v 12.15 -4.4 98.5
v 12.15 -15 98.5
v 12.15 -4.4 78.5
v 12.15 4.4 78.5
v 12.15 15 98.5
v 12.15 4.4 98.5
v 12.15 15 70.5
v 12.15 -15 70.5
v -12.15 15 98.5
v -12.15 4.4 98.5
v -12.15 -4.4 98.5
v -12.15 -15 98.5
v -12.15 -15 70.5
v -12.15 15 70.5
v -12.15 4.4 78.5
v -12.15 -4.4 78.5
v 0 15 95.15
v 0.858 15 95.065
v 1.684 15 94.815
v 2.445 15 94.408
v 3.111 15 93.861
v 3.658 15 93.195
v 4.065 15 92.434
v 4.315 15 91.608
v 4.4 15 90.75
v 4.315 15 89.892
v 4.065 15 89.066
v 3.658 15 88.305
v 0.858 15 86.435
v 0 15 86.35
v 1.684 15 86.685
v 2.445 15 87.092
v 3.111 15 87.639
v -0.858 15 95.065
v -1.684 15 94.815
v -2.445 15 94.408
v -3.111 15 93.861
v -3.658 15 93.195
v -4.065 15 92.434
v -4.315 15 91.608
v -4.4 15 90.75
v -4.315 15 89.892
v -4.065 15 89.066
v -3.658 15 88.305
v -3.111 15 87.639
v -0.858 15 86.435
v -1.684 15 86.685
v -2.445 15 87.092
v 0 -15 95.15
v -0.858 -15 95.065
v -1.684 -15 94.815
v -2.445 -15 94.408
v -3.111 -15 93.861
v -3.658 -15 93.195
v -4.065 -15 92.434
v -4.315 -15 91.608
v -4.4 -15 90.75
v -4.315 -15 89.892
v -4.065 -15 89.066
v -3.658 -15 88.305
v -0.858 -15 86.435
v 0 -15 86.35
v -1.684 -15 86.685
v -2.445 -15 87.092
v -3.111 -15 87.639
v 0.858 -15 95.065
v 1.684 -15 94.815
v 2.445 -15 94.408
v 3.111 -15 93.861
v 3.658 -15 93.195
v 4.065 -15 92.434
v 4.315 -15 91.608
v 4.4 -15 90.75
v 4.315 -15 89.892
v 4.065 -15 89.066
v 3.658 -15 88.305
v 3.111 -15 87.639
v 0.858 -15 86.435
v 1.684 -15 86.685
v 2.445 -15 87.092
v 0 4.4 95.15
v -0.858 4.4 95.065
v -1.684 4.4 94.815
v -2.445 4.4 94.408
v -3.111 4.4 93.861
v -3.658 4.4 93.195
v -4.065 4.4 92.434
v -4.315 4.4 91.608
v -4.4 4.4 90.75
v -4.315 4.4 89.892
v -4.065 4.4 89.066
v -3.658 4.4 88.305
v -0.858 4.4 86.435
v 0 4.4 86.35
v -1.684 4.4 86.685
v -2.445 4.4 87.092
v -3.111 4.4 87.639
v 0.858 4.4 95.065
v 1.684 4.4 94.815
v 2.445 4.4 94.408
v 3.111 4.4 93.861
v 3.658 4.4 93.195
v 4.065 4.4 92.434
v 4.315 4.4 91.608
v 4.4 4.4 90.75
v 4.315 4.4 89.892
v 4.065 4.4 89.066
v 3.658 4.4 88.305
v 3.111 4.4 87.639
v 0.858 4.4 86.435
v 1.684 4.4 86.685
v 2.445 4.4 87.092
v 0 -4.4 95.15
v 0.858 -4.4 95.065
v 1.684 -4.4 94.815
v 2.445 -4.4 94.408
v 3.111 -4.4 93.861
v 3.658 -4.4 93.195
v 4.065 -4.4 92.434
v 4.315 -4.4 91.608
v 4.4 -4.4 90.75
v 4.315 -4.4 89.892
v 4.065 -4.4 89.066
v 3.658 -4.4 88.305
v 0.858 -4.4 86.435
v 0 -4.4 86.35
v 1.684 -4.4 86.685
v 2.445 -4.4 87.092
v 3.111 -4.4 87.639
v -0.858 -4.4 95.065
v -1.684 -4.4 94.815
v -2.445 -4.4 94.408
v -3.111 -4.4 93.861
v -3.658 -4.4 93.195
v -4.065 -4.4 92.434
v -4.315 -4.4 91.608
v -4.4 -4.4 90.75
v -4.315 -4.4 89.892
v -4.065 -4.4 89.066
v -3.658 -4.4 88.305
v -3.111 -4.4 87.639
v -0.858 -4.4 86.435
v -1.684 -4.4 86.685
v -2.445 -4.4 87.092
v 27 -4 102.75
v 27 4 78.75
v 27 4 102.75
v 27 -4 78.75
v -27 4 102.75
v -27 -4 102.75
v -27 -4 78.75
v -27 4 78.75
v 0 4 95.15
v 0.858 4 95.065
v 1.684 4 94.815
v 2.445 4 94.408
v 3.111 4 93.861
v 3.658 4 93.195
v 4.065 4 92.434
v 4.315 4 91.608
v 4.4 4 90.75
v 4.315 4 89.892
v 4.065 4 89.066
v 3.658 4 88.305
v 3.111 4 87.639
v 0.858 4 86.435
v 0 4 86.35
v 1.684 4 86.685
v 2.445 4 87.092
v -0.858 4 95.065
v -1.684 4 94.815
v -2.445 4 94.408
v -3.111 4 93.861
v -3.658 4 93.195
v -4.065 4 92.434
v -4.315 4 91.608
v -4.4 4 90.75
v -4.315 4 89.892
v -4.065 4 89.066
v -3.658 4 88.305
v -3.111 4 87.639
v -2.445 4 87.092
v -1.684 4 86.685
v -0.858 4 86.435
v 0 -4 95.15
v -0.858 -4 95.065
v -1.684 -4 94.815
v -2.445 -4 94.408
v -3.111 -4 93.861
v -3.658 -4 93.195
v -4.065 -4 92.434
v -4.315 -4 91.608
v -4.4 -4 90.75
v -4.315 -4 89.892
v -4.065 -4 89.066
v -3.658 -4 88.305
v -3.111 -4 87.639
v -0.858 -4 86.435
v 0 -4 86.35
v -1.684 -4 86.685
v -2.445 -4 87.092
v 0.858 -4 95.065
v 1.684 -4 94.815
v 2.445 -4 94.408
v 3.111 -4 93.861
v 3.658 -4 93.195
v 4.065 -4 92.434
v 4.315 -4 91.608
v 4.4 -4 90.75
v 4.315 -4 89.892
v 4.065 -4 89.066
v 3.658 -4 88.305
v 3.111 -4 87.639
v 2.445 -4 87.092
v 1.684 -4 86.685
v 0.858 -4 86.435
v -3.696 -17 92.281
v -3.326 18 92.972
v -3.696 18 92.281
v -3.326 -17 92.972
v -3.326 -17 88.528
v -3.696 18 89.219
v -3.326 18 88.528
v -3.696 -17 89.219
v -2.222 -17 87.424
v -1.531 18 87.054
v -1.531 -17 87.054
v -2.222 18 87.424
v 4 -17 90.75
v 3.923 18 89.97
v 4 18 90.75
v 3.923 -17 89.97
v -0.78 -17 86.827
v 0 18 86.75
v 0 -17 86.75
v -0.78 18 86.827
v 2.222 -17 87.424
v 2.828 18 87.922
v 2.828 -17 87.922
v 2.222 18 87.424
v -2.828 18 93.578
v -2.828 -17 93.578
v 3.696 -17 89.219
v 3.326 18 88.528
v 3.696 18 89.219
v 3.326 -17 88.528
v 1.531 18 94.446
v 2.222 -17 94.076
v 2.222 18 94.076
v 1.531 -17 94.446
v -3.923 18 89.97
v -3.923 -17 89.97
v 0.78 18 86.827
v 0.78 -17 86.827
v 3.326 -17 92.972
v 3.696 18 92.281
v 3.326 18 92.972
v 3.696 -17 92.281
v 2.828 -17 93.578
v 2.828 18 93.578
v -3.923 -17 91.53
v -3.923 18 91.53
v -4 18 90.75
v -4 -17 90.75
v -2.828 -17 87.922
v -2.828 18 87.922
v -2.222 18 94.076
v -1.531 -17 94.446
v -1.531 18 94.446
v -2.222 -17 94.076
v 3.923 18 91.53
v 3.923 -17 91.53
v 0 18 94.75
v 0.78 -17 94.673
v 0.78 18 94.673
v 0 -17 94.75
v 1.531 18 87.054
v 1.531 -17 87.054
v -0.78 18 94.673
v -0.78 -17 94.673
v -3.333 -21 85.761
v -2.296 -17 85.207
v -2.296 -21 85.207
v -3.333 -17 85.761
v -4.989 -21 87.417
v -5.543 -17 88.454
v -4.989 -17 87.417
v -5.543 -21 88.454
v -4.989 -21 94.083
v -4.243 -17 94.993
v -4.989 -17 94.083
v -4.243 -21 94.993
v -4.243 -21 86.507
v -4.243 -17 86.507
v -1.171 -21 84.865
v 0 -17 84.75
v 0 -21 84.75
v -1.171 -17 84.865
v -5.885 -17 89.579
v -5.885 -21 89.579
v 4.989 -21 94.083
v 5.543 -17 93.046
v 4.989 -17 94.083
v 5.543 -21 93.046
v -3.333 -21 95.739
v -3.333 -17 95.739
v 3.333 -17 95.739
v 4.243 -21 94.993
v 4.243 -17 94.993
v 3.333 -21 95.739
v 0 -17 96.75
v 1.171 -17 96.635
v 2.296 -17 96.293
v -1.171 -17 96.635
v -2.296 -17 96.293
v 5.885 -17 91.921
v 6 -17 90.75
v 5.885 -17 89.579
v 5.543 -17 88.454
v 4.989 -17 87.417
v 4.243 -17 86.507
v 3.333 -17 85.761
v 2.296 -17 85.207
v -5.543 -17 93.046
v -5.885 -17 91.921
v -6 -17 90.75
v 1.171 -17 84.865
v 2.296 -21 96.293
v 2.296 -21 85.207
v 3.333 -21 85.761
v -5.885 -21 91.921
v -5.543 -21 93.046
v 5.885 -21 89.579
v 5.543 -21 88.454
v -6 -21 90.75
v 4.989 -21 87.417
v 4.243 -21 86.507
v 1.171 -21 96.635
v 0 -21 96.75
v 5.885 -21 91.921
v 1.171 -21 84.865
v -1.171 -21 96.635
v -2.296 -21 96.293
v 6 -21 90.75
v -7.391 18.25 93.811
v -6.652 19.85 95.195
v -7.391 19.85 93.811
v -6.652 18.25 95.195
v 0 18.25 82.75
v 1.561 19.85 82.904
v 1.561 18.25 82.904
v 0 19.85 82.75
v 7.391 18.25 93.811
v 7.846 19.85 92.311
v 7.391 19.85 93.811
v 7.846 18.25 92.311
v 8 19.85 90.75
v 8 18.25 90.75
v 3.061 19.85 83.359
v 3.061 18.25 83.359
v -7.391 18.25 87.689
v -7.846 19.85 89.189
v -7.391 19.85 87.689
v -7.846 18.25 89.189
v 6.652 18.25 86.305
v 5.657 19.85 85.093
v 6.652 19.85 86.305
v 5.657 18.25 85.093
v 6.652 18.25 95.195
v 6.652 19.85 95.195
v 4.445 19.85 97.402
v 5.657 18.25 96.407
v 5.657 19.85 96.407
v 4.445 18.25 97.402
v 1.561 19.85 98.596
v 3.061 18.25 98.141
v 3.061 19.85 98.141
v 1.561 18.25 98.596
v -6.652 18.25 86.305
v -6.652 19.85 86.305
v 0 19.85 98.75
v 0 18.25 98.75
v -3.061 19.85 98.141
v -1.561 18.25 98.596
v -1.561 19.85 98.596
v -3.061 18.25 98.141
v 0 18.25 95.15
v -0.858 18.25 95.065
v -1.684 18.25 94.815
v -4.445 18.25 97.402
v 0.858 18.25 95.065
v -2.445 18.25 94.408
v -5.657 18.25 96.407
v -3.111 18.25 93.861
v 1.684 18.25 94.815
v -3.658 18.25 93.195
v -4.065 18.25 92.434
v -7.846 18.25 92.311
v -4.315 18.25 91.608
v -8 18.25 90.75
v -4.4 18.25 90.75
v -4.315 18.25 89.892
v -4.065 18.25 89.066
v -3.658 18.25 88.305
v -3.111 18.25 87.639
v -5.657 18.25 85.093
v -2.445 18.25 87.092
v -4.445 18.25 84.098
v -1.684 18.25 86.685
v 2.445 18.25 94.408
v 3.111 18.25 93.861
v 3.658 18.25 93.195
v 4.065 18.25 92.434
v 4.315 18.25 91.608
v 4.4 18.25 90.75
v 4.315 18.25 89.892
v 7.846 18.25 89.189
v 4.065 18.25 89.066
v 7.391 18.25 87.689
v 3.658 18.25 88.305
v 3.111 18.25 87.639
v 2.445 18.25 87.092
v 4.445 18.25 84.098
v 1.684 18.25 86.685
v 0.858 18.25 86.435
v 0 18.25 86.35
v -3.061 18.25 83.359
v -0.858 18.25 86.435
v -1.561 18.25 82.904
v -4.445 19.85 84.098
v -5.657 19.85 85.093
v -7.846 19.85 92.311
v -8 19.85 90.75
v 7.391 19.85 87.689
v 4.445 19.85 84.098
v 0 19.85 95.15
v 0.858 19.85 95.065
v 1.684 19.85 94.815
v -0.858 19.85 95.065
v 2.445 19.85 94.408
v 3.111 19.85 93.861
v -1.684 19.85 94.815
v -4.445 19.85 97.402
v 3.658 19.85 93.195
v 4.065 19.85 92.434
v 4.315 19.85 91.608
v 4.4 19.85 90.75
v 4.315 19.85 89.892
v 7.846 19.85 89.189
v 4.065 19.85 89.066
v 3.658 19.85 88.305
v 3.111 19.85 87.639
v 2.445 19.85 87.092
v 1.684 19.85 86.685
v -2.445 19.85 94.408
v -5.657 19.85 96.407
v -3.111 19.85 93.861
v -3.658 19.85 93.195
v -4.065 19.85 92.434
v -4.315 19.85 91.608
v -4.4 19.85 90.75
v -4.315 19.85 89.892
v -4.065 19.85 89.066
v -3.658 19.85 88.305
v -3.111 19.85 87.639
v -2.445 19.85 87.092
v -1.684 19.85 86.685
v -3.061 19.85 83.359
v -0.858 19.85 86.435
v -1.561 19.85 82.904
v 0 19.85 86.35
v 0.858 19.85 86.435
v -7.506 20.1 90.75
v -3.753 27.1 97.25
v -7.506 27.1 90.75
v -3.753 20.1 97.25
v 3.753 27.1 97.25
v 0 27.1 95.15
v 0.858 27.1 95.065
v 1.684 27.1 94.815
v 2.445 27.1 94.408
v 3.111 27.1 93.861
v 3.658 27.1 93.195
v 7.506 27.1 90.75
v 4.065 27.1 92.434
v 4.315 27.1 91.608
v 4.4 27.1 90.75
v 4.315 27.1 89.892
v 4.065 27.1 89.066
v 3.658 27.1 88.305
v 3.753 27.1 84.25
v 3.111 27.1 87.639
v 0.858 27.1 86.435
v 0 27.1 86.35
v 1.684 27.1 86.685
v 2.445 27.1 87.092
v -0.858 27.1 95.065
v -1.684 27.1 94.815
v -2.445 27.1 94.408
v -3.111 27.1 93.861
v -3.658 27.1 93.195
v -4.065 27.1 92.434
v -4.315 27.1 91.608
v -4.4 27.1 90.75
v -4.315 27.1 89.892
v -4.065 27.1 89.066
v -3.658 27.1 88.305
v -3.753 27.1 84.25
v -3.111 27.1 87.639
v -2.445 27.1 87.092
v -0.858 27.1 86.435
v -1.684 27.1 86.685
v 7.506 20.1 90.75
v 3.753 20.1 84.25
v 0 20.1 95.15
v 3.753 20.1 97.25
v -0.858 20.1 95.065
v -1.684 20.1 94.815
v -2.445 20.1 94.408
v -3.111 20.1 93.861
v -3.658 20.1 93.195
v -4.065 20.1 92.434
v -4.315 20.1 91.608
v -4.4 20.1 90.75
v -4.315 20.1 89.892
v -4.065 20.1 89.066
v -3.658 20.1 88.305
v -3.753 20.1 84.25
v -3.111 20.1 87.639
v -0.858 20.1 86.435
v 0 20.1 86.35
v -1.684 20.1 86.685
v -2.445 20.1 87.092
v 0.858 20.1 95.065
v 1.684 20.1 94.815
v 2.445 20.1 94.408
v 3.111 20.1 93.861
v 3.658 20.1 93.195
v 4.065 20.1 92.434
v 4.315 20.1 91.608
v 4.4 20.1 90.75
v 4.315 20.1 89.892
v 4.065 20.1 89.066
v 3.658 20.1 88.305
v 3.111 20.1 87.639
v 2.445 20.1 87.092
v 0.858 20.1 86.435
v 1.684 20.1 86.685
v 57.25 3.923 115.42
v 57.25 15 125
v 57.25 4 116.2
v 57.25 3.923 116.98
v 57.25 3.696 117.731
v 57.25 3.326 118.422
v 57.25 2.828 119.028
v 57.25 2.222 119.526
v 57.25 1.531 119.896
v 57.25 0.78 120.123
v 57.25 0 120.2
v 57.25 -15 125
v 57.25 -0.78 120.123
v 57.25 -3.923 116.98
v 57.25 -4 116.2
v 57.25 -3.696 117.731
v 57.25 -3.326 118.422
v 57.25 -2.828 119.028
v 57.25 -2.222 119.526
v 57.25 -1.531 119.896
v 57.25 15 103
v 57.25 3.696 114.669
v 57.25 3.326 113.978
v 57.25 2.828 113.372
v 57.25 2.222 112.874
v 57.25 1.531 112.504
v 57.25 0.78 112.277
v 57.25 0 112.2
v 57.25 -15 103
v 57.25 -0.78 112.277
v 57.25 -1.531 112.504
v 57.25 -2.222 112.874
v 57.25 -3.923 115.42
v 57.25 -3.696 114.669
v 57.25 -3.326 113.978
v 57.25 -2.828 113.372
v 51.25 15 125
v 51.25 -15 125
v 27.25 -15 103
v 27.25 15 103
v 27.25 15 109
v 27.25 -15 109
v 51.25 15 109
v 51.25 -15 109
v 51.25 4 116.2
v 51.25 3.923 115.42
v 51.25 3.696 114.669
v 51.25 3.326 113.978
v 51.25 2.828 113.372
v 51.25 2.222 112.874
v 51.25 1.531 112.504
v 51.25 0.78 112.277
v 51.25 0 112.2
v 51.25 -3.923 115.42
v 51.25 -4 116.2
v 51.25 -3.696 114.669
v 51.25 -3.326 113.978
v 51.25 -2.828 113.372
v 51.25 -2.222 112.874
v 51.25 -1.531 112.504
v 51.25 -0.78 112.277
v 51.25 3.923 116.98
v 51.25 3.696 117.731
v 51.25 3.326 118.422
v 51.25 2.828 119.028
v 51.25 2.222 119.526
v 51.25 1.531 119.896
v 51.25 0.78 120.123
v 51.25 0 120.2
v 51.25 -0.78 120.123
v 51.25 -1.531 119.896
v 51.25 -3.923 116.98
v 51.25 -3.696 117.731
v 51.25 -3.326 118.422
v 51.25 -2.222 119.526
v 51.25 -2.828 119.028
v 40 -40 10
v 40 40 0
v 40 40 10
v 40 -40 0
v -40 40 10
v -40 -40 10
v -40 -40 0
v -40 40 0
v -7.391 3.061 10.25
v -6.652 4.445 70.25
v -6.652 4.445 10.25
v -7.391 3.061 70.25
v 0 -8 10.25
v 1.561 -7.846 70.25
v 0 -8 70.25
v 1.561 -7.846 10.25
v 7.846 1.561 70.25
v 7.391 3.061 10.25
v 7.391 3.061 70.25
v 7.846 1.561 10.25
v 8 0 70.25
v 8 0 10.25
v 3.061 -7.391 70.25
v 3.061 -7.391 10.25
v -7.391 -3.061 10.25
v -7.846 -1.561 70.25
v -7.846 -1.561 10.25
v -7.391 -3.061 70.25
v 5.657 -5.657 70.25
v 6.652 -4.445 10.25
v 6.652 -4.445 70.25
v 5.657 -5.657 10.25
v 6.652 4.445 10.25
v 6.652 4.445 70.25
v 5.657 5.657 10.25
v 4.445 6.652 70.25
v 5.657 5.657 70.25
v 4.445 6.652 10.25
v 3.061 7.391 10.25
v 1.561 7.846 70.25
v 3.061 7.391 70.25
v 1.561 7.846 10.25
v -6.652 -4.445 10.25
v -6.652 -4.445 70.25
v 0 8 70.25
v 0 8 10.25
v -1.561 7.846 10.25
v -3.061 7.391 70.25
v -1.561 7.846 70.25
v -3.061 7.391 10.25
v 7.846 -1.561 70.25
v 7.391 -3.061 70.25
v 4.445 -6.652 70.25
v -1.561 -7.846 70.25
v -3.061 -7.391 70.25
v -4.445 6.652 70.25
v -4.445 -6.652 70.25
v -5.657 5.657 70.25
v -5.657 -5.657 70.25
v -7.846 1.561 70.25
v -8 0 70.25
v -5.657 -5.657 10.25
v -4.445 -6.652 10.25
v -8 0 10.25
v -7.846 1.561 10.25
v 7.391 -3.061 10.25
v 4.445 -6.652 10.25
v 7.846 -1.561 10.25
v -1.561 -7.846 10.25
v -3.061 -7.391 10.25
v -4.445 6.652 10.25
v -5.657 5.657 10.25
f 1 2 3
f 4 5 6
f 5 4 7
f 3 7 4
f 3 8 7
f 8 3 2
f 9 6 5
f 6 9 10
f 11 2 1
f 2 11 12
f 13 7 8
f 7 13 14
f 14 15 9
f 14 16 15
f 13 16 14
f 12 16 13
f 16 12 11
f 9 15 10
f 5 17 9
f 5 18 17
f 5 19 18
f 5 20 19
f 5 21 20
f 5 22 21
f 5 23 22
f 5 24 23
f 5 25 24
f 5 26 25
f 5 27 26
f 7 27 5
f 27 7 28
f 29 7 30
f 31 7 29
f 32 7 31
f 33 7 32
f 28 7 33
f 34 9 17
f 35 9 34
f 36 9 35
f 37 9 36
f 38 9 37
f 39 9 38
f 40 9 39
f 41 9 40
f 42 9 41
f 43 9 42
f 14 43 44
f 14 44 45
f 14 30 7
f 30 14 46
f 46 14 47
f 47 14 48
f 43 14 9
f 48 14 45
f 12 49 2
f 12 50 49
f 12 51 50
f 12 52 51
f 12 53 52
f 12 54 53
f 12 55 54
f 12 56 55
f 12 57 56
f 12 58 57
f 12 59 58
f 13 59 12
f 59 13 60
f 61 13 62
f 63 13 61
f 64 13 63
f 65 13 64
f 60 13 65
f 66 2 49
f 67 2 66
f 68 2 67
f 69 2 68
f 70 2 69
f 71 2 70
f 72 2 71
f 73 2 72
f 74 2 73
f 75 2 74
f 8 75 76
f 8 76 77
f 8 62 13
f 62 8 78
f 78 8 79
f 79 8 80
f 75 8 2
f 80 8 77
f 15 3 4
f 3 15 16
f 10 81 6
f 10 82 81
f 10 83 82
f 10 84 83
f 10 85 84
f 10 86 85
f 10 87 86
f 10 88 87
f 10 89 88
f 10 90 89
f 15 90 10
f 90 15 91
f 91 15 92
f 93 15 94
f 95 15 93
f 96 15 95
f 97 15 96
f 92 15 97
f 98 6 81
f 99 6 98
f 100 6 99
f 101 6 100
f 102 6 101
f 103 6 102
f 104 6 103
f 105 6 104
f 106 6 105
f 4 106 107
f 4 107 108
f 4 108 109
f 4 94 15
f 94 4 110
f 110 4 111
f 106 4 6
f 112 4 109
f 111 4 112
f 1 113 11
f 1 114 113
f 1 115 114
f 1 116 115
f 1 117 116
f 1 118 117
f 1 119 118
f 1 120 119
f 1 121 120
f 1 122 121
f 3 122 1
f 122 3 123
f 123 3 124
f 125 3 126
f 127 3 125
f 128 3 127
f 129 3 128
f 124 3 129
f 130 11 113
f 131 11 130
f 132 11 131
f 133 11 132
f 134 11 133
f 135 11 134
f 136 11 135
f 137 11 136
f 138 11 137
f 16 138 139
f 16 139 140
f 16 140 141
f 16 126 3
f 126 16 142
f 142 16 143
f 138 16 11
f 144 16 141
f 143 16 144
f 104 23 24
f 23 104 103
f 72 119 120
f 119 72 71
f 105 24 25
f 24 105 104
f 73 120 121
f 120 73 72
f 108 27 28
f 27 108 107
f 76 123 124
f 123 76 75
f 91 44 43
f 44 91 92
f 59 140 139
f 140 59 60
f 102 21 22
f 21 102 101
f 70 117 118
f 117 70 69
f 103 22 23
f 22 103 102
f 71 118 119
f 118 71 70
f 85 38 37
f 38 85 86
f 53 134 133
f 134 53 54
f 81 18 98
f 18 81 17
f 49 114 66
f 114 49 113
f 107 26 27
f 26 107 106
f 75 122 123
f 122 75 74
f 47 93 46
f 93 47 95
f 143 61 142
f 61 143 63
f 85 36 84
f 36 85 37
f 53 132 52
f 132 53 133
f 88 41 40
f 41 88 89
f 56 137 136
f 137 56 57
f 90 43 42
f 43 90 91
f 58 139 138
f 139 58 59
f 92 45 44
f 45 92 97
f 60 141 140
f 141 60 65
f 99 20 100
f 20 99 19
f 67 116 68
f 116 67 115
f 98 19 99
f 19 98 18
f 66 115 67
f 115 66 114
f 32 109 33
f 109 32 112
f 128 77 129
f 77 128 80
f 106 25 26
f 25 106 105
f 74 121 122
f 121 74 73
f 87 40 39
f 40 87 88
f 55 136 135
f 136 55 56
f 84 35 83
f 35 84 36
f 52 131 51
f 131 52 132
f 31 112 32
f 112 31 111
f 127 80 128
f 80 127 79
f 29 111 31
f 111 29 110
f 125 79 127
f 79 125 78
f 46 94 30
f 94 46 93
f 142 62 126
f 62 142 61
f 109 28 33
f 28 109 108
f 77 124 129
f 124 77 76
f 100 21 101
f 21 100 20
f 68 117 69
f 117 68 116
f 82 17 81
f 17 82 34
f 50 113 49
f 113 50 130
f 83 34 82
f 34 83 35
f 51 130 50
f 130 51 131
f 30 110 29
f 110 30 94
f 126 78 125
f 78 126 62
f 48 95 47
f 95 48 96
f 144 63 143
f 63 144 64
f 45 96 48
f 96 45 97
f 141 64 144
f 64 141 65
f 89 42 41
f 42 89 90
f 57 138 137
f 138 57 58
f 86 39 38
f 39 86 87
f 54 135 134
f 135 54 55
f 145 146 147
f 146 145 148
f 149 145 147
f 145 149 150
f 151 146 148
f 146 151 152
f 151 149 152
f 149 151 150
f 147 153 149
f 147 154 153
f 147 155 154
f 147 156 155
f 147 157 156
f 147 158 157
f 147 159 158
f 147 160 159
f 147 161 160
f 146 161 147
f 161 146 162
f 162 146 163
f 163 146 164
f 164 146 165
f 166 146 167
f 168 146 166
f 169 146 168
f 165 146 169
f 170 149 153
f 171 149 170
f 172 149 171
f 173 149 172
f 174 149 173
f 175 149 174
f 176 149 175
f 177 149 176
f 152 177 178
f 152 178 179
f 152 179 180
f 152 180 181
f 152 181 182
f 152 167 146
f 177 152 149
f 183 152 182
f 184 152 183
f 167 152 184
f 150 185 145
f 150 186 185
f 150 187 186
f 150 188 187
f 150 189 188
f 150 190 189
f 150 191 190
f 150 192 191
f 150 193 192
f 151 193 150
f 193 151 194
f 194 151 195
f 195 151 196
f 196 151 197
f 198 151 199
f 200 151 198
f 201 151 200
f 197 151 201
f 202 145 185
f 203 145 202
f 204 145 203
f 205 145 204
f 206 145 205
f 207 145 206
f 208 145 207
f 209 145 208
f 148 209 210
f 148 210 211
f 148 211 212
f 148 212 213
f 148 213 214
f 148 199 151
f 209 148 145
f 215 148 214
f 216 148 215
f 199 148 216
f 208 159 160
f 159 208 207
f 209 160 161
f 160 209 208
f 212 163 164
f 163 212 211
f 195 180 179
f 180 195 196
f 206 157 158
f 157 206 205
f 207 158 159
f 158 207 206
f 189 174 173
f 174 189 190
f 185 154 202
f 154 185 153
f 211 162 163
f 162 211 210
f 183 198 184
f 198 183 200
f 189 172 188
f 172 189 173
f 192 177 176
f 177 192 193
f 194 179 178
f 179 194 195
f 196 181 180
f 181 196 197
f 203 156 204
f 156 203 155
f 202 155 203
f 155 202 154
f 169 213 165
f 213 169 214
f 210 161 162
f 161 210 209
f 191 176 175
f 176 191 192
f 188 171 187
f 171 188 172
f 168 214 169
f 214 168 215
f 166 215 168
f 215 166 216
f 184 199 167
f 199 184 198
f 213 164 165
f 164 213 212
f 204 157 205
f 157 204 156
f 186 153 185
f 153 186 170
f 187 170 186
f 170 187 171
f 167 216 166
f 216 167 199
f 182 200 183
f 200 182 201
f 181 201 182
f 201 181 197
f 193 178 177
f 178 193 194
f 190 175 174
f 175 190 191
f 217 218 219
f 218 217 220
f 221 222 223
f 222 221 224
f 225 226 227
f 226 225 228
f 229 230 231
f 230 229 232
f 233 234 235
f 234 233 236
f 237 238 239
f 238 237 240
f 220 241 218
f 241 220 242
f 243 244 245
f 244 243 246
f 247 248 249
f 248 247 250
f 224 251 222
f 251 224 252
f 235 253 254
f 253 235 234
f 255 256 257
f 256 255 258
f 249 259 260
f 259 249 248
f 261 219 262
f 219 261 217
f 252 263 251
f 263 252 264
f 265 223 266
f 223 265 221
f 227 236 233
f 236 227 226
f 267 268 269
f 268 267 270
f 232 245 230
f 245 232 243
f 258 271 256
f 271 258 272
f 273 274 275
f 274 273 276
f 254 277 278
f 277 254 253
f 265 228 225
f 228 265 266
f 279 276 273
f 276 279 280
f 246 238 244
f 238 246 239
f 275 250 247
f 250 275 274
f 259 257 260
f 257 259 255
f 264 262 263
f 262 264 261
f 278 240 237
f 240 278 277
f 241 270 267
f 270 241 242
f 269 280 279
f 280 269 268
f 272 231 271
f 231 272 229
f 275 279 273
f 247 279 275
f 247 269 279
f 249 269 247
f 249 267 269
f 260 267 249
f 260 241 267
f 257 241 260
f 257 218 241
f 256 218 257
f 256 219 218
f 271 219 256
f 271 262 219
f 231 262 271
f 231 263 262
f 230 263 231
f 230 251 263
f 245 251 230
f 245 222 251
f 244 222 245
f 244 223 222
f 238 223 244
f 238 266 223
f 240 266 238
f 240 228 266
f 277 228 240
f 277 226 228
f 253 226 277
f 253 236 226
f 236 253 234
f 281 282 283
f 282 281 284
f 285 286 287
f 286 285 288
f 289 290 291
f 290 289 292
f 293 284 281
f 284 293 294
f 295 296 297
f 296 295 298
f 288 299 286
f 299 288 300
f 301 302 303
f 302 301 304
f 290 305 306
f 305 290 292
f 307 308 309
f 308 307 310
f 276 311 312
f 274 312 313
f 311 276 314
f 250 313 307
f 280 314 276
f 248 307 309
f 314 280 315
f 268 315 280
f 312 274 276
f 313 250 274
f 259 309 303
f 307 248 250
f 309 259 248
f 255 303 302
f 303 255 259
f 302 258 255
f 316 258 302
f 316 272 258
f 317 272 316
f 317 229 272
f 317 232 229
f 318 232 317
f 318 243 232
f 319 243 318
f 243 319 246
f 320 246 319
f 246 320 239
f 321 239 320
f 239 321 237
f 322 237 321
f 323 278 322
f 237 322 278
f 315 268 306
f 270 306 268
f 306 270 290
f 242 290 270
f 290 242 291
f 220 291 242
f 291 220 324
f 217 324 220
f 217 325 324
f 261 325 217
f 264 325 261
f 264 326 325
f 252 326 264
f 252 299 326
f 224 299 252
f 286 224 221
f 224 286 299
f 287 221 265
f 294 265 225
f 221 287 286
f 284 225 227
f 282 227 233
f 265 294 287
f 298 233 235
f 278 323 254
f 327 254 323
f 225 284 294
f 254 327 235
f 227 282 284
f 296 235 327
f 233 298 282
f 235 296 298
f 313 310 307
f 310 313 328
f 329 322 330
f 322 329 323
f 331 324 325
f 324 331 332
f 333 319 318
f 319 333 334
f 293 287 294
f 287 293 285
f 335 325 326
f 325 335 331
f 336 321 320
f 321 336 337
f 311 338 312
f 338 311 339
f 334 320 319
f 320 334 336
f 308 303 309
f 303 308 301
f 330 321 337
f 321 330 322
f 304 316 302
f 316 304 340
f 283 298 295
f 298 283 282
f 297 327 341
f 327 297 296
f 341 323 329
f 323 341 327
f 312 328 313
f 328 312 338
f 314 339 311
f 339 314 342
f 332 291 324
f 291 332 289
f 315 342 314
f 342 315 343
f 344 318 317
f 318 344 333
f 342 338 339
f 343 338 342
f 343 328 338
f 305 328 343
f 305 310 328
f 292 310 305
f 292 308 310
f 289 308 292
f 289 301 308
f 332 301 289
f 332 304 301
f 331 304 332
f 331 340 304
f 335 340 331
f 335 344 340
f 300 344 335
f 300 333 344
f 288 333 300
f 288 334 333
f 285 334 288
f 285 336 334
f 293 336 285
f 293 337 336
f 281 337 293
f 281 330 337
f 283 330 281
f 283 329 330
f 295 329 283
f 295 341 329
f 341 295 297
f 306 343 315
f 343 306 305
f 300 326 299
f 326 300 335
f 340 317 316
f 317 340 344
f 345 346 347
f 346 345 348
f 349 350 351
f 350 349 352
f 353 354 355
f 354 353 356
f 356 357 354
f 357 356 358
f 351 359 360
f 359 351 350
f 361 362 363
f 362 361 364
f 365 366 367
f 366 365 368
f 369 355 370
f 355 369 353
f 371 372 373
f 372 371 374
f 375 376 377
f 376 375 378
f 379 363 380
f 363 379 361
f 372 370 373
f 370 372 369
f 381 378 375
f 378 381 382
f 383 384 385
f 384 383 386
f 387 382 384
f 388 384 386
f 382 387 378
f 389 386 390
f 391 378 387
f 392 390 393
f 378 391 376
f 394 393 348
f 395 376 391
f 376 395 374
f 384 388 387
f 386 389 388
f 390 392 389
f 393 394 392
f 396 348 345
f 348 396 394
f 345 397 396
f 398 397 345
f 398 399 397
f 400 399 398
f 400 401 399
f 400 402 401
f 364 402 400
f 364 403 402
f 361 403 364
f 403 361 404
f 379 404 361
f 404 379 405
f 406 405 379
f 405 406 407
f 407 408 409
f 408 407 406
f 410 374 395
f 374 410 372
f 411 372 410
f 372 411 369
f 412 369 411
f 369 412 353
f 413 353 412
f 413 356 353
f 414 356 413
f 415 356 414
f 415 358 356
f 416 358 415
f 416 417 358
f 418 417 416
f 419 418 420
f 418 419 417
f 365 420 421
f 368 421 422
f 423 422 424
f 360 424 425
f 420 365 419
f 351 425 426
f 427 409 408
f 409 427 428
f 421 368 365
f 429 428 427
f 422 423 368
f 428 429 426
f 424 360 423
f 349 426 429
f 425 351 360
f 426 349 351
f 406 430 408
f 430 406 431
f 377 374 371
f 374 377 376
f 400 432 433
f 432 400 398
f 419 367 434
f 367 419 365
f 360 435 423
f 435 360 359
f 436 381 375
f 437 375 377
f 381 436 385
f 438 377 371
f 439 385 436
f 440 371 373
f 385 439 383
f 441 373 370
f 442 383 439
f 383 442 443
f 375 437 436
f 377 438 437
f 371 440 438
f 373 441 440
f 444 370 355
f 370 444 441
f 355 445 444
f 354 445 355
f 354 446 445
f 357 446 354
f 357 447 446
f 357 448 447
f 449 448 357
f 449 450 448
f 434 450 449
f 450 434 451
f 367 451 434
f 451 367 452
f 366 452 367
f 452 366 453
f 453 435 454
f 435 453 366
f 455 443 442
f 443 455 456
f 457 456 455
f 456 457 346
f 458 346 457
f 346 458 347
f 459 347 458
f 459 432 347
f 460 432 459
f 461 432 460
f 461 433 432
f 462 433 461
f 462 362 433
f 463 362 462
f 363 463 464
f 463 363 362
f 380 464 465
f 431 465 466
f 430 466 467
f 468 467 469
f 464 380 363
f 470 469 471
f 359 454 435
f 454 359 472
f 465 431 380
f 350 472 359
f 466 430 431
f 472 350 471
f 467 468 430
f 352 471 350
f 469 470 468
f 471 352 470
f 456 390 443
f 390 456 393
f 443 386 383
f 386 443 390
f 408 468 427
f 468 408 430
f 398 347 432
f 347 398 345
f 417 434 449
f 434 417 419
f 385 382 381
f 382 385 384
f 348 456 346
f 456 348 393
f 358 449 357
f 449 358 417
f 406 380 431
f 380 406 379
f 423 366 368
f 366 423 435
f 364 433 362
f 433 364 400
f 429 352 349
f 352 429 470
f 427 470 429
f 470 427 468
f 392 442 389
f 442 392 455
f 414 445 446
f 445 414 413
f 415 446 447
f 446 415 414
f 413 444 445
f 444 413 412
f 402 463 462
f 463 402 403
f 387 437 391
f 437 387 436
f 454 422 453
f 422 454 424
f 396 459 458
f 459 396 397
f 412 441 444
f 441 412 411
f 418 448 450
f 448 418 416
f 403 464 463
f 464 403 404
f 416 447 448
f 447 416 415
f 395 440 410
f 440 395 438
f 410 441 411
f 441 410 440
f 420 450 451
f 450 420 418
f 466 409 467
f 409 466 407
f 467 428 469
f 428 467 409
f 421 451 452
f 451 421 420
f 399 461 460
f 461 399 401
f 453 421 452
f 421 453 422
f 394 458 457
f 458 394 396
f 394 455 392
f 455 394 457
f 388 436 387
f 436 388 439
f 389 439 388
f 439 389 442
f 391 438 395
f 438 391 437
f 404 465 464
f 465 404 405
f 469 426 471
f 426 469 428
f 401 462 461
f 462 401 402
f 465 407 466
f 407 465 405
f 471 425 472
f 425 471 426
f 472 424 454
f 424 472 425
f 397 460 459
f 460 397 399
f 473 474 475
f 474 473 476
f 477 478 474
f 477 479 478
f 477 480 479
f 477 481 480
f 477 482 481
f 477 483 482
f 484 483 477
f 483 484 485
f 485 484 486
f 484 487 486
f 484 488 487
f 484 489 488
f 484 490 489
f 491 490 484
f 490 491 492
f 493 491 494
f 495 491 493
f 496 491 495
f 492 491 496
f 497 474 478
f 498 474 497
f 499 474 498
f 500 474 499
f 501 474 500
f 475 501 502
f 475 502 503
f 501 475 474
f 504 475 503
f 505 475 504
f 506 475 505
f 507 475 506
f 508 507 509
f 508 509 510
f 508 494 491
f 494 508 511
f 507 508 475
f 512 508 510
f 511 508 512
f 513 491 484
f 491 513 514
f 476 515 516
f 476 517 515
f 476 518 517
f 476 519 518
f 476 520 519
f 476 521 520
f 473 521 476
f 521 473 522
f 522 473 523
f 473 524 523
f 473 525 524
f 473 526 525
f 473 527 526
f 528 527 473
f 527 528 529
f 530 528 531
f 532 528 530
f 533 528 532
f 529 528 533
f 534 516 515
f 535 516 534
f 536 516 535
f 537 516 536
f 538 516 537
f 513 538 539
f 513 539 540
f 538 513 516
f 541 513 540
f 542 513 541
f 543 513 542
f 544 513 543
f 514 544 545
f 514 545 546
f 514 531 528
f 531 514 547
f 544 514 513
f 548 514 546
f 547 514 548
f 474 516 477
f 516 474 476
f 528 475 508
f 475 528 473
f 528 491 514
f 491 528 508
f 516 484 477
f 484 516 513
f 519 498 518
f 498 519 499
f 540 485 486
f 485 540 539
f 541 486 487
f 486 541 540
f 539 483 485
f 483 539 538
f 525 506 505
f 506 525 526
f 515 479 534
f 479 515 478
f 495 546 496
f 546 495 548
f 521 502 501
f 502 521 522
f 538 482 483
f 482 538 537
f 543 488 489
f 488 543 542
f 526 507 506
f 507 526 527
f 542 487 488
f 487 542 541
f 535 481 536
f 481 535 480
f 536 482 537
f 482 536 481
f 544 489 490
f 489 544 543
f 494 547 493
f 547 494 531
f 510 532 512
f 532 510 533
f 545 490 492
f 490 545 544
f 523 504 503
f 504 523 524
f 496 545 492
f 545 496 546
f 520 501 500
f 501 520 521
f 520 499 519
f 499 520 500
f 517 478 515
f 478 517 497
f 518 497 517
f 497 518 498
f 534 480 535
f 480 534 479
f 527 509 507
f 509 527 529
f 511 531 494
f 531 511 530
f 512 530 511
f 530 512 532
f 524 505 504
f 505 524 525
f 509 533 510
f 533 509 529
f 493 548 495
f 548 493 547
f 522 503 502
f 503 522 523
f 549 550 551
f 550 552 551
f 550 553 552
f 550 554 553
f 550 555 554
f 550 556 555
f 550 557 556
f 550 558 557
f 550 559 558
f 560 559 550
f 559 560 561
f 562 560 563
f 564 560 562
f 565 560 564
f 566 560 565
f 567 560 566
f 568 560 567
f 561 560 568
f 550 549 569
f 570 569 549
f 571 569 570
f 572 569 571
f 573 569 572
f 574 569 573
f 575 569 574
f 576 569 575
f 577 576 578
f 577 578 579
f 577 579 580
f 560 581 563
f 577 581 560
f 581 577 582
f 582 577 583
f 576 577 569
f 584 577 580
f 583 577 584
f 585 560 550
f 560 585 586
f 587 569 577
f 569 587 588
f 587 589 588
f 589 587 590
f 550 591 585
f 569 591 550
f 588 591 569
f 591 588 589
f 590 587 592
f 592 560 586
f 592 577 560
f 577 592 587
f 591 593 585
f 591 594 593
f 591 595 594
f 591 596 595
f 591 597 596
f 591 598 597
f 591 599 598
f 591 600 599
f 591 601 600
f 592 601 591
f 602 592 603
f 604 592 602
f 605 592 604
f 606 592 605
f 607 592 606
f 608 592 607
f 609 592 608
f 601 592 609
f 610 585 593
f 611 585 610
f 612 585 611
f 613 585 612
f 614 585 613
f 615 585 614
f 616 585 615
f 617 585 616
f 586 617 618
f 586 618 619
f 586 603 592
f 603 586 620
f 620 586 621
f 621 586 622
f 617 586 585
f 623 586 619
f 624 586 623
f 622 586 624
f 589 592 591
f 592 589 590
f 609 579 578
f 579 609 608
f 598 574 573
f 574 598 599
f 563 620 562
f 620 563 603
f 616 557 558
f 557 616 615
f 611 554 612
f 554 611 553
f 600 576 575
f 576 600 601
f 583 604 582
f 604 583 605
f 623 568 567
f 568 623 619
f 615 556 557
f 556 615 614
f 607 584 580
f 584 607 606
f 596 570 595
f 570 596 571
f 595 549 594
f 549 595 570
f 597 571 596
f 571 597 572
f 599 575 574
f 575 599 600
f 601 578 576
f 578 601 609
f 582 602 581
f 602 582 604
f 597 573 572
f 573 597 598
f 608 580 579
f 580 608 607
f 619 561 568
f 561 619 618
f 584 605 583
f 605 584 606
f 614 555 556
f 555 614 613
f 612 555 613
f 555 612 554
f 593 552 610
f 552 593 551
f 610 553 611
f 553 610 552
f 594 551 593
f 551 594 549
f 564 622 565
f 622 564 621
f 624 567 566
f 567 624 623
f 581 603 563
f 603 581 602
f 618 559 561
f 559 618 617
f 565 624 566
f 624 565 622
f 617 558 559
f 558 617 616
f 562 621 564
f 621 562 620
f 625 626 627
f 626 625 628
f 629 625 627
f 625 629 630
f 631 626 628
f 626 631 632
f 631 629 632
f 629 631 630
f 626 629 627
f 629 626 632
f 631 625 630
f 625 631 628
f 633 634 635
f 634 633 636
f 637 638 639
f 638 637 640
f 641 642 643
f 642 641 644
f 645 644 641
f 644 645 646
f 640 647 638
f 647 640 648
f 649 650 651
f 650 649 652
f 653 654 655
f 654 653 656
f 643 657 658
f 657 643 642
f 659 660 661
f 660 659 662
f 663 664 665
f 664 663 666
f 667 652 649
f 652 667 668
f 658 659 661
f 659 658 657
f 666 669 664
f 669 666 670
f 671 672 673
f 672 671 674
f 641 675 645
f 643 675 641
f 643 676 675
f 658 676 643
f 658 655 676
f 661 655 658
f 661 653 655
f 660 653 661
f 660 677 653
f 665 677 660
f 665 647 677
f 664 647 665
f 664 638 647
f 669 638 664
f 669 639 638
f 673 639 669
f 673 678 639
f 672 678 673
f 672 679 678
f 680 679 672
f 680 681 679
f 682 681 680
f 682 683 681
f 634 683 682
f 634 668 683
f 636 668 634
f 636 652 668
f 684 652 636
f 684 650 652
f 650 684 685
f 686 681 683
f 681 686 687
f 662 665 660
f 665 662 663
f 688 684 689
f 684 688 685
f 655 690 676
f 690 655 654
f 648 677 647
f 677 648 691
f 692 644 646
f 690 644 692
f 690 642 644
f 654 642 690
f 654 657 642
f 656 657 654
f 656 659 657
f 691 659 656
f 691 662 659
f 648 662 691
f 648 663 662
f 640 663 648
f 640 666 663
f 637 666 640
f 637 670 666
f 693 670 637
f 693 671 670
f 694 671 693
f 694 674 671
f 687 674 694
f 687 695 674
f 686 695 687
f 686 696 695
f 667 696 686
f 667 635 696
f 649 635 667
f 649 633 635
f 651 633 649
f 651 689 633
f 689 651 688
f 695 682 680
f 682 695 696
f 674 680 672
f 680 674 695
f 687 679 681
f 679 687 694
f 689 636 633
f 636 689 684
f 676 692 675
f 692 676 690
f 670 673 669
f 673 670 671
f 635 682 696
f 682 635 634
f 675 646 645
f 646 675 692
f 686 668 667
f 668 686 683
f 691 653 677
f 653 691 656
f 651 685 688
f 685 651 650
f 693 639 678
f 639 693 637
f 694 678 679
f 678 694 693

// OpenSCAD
$fn = 32;

// ------------------------------------------------------------------------
// Lamp arm: column d16 x 60 mm, arm 54 mm
// Every part is its own module, assembly() places every instance.
// ------------------------------------------------------------------------

// --- part 1 ---
module lamp_base() {
  difference() {
    translate([-40, -40, 0]) cube([80, 80, 10]);
  }
}

// --- part 2 ---
module lamp_column() {
  cylinder(h = 60, d = 16);
}

// --- part 3 ---
module head_fork() {
  difference() {
    translate([-12.15, -15, 0]) cube([24.3, 30, 28]);
    translate([-13.15, -4.4, 8]) cube([26.3, 8.8, 21]);
    translate([0, 0, 20.25]) rotate([90, 0, 0]) cylinder(h = 32, d = 8.8, center = true);
  }
}

// --- part 4 ---
module lamp_arm() {
  difference() {
    translate([-27, -4, 0]) cube([54, 8, 24]);
    translate([0, 0, 12]) rotate([90, 0, 0]) cylinder(h = 10, d = 8.8, center = true);
  }
}

// --- part 5 ---
module arm_pin() {
  rotate([0, 90, 0]) cylinder(h = 36, d = 8, center = true);
  translate([-21, 0, 0]) rotate([0, 90, 0]) cylinder(h = 4, d = 12);
}

// --- part 6 ---
module arm_washer() {
  difference() {
      translate([0, 0, 0]) cylinder(h = 1.6, d = 16);
      translate([0, 0, -1]) cylinder(h = 3.6, d = 8.8);
    }
}

// --- part 7 ---
module arm_nut() {
  difference() {
    linear_extrude(height = 7) polygon(points = [[7.506, 0], [3.753, 6.5], [-3.753, 6.5], [-7.506, 0], [-3.753, -6.5], [3.753, -6.5]]);
    translate([0, 0, -1]) cylinder(h = 9, d = 8.8);
  }
}

// --- part 8 ---
module shade_bracket() {
  difference() {
    translate([-15, -15, 0]) cube([30, 30, 22]);
    translate([-16, -16, 6]) cube([25, 32, 17]);
    translate([12, 0, 13.2]) rotate([0, 90, 0]) cylinder(h = 8, d = 8, center = true);
  }
}

// --- assembly ---
module assembly() {
  color([0.80, 0.24, 0.20]) translate([0, 0, 0]) rotate([0, 0, 0]) lamp_base();
  color([0.20, 0.45, 0.75]) translate([0, 0, 10.25]) rotate([0, 0, 0]) lamp_column();
  color([0.25, 0.62, 0.32]) translate([0, 0, 70.5]) rotate([0, 0, 0]) head_fork();
  color([0.92, 0.70, 0.18]) translate([0, 0, 78.75]) rotate([0, 0, 0]) lamp_arm();
  color([0.58, 0.35, 0.70]) translate([0, 0, 90.75]) rotate([0, 0, 90]) arm_pin();
  color([0.16, 0.66, 0.66]) translate([0, 19.85, 90.75]) rotate([90, 0, 0]) arm_washer();
  color([0.85, 0.48, 0.18]) translate([0, 27.1, 90.75]) rotate([90, 0, 0]) arm_nut();
  color([0.55, 0.60, 0.65]) translate([42.25, 0, 103]) rotate([0, 0, 0]) shade_bracket();
}

assembly();
